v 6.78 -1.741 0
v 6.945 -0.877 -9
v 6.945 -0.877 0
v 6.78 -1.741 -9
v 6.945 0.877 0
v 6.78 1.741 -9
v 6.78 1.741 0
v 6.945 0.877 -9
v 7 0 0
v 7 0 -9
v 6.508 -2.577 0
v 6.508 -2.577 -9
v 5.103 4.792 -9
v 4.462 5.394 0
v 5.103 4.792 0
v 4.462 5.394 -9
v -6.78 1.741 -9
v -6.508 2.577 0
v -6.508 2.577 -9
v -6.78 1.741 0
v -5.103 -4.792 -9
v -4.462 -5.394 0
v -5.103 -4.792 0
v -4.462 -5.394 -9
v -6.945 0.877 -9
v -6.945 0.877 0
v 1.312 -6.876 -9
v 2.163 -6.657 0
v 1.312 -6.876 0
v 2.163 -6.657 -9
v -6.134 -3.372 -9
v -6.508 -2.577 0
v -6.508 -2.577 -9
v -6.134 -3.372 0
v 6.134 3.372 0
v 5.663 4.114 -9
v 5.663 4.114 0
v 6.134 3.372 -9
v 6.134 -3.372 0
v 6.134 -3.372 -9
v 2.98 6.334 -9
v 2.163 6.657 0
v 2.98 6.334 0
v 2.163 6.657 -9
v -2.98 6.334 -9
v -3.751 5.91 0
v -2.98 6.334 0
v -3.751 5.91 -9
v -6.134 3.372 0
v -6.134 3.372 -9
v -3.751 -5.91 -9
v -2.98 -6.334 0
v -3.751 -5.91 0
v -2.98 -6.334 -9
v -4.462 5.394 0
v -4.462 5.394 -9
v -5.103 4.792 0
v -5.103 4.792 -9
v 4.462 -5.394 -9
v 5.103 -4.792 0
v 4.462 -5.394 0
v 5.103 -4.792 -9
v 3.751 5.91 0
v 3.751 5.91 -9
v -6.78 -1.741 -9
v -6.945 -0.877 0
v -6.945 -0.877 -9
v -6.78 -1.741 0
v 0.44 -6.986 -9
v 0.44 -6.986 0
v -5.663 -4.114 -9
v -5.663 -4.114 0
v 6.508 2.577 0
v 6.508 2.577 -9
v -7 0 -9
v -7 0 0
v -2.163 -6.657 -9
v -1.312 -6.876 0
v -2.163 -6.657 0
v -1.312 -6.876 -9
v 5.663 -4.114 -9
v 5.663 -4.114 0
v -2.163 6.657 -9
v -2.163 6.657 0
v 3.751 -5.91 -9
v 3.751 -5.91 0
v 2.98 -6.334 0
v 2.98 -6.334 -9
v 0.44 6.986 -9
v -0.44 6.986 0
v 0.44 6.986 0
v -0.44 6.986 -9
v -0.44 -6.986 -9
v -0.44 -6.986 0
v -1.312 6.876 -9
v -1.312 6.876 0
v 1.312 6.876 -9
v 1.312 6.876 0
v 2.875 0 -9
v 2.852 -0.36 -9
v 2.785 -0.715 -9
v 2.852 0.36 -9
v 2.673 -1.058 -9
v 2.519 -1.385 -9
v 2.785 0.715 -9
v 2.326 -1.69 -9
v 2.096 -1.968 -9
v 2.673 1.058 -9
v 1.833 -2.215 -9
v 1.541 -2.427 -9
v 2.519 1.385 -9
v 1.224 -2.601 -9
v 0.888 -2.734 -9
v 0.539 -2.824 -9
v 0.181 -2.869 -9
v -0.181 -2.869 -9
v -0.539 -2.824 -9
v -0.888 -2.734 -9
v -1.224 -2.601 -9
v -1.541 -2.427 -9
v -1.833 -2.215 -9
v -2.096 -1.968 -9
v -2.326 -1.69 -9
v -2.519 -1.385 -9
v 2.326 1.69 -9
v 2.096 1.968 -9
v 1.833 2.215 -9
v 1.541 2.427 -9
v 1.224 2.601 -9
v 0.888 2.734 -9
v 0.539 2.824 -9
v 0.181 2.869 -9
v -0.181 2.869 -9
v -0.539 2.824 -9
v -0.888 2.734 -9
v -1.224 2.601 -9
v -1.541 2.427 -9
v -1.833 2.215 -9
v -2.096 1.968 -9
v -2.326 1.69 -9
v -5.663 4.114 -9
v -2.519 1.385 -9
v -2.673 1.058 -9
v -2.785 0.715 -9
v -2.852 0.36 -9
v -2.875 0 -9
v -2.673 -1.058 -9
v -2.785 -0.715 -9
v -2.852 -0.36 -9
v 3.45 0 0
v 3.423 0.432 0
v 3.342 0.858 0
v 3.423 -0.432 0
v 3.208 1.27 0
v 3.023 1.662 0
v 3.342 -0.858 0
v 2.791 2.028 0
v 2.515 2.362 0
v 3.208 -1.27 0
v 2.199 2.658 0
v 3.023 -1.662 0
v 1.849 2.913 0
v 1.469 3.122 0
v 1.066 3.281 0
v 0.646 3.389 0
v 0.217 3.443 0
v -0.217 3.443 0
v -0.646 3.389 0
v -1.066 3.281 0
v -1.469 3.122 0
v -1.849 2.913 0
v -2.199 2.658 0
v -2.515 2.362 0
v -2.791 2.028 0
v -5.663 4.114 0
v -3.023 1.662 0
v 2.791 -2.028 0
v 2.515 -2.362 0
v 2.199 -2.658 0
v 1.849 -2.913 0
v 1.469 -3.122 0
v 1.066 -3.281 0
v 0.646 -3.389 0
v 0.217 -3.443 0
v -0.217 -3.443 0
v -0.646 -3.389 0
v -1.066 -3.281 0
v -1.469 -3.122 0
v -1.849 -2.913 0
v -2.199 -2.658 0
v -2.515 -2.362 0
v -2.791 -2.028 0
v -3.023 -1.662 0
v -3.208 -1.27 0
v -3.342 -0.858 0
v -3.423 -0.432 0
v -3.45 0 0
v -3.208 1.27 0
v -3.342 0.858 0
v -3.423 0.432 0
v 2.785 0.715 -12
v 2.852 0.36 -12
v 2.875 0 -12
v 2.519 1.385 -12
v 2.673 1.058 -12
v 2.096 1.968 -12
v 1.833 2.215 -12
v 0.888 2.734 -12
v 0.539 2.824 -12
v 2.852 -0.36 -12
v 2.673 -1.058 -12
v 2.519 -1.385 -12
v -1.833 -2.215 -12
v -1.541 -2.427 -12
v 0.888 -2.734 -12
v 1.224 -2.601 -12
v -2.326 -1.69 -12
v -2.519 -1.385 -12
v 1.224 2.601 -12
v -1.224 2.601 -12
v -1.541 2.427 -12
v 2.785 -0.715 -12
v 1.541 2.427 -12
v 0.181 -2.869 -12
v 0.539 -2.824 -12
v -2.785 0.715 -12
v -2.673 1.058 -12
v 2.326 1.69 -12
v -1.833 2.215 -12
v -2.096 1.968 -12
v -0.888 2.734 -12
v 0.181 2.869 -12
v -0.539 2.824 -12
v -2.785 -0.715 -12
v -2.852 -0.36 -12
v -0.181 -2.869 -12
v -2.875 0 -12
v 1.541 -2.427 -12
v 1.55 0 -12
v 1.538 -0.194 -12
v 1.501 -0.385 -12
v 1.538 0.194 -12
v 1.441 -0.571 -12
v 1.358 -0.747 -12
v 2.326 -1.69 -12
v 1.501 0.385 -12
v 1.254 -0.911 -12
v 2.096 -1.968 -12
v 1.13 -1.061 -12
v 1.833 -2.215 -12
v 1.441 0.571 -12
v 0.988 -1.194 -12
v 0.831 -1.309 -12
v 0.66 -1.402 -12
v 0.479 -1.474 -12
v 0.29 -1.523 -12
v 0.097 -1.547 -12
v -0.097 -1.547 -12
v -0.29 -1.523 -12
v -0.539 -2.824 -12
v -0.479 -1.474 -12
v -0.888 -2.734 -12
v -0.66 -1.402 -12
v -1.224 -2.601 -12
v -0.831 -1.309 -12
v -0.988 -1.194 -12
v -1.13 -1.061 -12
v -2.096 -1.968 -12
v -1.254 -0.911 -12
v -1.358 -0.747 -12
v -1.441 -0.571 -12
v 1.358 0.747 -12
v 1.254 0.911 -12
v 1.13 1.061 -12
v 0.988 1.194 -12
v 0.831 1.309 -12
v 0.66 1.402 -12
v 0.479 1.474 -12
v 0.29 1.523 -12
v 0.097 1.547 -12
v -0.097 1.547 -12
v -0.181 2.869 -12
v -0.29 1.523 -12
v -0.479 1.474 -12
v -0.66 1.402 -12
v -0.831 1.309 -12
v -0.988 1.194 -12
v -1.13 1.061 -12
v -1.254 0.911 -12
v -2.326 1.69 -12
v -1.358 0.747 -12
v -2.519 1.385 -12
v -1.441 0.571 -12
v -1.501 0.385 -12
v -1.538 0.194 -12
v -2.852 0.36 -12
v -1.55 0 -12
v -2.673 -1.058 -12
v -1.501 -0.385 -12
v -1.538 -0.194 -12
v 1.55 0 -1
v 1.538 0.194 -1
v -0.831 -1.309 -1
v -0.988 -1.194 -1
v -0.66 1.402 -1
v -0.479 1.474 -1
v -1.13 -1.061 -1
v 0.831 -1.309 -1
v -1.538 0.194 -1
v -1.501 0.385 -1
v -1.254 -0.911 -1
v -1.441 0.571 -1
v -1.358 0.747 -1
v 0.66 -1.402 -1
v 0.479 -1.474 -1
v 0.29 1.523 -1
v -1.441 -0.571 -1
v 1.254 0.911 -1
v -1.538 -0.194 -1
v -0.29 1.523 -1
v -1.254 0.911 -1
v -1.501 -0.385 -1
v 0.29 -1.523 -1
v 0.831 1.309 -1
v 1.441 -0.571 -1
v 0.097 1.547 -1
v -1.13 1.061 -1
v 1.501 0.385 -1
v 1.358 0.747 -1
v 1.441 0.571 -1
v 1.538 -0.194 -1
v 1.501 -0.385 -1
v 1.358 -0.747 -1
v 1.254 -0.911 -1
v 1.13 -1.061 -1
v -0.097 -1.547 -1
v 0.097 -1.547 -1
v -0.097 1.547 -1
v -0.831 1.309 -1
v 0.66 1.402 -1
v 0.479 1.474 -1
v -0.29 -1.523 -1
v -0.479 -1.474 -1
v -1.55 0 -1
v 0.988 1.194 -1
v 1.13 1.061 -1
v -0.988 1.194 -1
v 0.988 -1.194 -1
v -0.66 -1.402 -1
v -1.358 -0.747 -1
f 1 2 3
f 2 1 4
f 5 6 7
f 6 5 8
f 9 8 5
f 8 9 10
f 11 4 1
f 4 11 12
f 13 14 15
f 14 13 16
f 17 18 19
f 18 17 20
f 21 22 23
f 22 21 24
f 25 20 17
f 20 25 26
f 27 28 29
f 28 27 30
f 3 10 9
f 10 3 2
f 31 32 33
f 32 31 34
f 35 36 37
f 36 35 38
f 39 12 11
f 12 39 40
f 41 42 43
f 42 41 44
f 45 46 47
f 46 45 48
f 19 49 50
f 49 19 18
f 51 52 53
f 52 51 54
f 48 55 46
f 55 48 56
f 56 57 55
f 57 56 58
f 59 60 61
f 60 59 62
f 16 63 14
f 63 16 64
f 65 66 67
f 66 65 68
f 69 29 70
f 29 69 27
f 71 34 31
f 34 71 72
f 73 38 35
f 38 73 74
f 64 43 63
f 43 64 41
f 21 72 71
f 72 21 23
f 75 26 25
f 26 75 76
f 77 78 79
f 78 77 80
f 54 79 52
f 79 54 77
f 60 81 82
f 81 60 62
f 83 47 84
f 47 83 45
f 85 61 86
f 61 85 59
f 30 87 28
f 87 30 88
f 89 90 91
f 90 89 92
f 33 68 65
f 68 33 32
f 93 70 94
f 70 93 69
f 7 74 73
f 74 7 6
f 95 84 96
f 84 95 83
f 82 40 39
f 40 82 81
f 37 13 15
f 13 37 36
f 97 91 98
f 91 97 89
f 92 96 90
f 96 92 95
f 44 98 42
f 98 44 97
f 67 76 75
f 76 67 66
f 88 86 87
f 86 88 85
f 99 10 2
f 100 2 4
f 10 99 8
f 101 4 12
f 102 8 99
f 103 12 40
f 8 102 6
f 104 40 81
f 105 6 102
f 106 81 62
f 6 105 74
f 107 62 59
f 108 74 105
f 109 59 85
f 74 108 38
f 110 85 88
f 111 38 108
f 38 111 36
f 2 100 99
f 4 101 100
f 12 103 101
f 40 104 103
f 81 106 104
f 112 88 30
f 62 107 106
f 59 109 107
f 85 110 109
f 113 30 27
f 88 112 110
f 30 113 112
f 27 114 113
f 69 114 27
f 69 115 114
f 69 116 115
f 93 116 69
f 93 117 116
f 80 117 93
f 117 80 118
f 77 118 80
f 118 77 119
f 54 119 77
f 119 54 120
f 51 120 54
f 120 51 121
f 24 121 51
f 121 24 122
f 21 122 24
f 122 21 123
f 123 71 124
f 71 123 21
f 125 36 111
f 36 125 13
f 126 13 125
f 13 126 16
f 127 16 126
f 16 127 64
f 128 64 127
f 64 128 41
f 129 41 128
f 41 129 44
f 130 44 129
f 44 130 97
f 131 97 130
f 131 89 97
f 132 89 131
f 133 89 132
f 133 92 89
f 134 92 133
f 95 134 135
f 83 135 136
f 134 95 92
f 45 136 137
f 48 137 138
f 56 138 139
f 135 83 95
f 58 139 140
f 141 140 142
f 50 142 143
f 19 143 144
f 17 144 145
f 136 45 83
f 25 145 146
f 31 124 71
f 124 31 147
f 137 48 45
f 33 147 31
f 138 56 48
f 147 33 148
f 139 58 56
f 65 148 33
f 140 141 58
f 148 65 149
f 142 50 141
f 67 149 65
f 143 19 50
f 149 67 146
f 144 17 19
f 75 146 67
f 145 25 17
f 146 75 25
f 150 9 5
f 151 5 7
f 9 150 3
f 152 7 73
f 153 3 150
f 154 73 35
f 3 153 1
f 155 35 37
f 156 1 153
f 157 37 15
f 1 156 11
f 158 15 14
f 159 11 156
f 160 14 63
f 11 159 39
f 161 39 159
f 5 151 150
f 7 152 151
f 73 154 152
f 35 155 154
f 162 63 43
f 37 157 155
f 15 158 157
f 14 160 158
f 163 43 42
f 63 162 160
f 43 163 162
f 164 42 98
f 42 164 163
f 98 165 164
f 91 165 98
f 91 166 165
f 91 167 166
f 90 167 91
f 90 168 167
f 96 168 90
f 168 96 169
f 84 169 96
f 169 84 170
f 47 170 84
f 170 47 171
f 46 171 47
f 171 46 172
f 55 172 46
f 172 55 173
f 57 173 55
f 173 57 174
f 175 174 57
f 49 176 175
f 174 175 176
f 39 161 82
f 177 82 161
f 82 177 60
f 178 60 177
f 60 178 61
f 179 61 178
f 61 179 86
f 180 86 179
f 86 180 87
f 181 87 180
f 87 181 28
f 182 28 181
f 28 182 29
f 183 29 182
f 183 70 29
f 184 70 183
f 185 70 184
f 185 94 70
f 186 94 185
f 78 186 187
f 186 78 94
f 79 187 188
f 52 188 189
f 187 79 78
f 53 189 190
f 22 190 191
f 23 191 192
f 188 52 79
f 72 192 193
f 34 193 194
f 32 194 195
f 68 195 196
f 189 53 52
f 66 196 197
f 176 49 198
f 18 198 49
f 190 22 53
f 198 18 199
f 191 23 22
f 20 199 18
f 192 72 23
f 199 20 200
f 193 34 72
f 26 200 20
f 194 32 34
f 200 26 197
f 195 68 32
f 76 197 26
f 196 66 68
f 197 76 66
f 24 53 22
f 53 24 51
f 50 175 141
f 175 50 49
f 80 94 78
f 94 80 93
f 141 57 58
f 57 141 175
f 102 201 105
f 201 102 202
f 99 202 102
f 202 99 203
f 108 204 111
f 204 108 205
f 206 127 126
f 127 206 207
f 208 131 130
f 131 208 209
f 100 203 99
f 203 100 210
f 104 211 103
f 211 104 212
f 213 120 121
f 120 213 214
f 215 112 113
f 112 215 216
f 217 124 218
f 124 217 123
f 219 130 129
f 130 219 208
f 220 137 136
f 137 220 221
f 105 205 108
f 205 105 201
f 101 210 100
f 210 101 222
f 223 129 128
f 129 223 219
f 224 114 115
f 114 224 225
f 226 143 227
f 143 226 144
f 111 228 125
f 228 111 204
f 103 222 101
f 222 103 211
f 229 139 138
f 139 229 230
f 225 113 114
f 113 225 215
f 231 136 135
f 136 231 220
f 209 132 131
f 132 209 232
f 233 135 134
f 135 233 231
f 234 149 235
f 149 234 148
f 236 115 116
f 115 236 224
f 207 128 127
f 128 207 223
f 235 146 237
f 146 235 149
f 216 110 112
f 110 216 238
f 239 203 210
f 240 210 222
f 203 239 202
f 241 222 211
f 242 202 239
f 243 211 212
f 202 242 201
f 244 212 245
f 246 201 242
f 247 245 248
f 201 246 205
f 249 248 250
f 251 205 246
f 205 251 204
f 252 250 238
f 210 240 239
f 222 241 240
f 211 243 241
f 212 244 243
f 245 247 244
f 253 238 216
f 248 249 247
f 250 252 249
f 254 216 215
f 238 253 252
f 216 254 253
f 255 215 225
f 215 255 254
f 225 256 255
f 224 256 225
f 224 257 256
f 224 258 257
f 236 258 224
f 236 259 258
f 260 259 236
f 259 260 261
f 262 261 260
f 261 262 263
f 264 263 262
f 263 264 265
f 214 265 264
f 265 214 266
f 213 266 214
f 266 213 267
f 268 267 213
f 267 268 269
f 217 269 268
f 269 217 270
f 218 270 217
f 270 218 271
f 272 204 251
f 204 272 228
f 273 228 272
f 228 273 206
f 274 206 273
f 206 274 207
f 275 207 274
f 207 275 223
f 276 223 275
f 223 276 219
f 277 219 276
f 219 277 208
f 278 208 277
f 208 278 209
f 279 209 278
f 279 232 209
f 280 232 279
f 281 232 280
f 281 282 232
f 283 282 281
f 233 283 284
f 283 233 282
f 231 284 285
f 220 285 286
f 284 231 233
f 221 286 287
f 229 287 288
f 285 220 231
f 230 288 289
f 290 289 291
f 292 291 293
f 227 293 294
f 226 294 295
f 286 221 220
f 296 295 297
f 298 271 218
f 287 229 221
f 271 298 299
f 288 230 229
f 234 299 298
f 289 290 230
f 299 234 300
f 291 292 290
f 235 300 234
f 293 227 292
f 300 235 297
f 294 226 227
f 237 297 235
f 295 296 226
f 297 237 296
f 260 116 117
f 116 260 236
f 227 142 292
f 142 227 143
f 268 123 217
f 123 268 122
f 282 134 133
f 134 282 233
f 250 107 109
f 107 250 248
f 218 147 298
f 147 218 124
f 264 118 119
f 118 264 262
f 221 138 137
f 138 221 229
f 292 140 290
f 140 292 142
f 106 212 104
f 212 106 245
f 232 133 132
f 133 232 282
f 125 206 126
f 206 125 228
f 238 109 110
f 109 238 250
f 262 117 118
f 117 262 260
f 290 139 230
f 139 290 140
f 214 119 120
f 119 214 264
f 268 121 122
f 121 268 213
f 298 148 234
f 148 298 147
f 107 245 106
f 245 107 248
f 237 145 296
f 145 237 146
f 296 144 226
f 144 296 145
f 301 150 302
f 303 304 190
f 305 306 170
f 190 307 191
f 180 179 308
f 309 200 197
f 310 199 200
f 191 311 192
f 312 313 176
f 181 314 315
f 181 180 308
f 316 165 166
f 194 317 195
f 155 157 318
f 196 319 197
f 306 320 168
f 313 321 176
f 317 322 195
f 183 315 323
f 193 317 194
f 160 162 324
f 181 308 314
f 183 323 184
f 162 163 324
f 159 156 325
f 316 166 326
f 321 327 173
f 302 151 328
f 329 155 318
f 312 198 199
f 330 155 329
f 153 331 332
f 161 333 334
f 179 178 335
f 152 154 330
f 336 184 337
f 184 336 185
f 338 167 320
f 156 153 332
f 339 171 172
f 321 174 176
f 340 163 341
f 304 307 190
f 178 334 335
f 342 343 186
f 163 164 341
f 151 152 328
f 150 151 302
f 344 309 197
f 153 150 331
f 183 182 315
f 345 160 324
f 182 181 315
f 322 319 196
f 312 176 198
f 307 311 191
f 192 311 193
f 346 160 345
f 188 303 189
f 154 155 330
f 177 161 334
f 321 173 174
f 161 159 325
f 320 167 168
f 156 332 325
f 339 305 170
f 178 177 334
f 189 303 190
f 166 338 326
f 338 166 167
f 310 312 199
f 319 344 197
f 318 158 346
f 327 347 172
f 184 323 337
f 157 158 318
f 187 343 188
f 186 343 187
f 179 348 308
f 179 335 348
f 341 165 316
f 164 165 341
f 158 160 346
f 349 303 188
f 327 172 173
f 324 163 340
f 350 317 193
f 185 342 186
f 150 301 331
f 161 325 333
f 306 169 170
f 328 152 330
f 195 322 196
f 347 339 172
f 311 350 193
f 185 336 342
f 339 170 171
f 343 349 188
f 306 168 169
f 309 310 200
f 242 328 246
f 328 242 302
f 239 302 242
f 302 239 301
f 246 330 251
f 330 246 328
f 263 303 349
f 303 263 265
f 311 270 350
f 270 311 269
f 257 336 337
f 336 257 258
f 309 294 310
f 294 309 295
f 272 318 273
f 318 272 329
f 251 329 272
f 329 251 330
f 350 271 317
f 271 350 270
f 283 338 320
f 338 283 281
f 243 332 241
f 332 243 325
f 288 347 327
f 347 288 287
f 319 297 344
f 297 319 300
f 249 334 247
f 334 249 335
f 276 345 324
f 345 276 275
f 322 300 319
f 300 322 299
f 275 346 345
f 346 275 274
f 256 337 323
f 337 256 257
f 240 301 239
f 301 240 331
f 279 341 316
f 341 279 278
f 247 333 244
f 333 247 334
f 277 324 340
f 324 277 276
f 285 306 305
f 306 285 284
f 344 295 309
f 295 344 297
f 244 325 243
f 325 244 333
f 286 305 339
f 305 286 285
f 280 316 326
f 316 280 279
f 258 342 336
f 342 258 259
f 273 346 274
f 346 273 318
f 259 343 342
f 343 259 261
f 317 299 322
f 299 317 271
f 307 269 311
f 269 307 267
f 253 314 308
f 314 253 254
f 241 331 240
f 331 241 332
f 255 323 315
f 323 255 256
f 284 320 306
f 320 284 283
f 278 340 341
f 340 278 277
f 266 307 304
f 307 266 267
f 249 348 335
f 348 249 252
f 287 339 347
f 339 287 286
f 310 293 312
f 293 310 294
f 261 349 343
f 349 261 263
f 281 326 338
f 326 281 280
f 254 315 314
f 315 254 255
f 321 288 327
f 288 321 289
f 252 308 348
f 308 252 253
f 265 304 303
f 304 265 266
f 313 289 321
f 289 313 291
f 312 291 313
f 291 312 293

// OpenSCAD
$fn = 50;


difference() {
	union() {
		translate(v = [0, 0, -9.0000000000]) {
			cylinder(h = 9, r = 7.0000000000);
		}
		#translate(v = [0, 0, -12.0000000000]) {
			cylinder(h = 12, r = 2.8750000000);
		}
	}
	union() {
		translate(v = [0, 0, 0]) {
			rotate(a = [0, 0, 0]) {
				difference() {
					union() {
						translate(v = [0, 0, -12.0000000000]) {
							cylinder(h = 12, r = 1.2500000000);
						}
						translate(v = [0, 0, -1.0000000000]) {
							cylinder(h = 1.0000000000, r1 = 1.5500000000, r2 = 3.4500000000);
						}
						translate(v = [0, 0, -12.0000000000]) {
							cylinder(h = 12, r = 1.5500000000);
						}
						translate(v = [0, 0, -12.0000000000]) {
							cylinder(h = 12, r = 1.2500000000);
						}
					}
					union();
				}
			}
		}
	}
}
